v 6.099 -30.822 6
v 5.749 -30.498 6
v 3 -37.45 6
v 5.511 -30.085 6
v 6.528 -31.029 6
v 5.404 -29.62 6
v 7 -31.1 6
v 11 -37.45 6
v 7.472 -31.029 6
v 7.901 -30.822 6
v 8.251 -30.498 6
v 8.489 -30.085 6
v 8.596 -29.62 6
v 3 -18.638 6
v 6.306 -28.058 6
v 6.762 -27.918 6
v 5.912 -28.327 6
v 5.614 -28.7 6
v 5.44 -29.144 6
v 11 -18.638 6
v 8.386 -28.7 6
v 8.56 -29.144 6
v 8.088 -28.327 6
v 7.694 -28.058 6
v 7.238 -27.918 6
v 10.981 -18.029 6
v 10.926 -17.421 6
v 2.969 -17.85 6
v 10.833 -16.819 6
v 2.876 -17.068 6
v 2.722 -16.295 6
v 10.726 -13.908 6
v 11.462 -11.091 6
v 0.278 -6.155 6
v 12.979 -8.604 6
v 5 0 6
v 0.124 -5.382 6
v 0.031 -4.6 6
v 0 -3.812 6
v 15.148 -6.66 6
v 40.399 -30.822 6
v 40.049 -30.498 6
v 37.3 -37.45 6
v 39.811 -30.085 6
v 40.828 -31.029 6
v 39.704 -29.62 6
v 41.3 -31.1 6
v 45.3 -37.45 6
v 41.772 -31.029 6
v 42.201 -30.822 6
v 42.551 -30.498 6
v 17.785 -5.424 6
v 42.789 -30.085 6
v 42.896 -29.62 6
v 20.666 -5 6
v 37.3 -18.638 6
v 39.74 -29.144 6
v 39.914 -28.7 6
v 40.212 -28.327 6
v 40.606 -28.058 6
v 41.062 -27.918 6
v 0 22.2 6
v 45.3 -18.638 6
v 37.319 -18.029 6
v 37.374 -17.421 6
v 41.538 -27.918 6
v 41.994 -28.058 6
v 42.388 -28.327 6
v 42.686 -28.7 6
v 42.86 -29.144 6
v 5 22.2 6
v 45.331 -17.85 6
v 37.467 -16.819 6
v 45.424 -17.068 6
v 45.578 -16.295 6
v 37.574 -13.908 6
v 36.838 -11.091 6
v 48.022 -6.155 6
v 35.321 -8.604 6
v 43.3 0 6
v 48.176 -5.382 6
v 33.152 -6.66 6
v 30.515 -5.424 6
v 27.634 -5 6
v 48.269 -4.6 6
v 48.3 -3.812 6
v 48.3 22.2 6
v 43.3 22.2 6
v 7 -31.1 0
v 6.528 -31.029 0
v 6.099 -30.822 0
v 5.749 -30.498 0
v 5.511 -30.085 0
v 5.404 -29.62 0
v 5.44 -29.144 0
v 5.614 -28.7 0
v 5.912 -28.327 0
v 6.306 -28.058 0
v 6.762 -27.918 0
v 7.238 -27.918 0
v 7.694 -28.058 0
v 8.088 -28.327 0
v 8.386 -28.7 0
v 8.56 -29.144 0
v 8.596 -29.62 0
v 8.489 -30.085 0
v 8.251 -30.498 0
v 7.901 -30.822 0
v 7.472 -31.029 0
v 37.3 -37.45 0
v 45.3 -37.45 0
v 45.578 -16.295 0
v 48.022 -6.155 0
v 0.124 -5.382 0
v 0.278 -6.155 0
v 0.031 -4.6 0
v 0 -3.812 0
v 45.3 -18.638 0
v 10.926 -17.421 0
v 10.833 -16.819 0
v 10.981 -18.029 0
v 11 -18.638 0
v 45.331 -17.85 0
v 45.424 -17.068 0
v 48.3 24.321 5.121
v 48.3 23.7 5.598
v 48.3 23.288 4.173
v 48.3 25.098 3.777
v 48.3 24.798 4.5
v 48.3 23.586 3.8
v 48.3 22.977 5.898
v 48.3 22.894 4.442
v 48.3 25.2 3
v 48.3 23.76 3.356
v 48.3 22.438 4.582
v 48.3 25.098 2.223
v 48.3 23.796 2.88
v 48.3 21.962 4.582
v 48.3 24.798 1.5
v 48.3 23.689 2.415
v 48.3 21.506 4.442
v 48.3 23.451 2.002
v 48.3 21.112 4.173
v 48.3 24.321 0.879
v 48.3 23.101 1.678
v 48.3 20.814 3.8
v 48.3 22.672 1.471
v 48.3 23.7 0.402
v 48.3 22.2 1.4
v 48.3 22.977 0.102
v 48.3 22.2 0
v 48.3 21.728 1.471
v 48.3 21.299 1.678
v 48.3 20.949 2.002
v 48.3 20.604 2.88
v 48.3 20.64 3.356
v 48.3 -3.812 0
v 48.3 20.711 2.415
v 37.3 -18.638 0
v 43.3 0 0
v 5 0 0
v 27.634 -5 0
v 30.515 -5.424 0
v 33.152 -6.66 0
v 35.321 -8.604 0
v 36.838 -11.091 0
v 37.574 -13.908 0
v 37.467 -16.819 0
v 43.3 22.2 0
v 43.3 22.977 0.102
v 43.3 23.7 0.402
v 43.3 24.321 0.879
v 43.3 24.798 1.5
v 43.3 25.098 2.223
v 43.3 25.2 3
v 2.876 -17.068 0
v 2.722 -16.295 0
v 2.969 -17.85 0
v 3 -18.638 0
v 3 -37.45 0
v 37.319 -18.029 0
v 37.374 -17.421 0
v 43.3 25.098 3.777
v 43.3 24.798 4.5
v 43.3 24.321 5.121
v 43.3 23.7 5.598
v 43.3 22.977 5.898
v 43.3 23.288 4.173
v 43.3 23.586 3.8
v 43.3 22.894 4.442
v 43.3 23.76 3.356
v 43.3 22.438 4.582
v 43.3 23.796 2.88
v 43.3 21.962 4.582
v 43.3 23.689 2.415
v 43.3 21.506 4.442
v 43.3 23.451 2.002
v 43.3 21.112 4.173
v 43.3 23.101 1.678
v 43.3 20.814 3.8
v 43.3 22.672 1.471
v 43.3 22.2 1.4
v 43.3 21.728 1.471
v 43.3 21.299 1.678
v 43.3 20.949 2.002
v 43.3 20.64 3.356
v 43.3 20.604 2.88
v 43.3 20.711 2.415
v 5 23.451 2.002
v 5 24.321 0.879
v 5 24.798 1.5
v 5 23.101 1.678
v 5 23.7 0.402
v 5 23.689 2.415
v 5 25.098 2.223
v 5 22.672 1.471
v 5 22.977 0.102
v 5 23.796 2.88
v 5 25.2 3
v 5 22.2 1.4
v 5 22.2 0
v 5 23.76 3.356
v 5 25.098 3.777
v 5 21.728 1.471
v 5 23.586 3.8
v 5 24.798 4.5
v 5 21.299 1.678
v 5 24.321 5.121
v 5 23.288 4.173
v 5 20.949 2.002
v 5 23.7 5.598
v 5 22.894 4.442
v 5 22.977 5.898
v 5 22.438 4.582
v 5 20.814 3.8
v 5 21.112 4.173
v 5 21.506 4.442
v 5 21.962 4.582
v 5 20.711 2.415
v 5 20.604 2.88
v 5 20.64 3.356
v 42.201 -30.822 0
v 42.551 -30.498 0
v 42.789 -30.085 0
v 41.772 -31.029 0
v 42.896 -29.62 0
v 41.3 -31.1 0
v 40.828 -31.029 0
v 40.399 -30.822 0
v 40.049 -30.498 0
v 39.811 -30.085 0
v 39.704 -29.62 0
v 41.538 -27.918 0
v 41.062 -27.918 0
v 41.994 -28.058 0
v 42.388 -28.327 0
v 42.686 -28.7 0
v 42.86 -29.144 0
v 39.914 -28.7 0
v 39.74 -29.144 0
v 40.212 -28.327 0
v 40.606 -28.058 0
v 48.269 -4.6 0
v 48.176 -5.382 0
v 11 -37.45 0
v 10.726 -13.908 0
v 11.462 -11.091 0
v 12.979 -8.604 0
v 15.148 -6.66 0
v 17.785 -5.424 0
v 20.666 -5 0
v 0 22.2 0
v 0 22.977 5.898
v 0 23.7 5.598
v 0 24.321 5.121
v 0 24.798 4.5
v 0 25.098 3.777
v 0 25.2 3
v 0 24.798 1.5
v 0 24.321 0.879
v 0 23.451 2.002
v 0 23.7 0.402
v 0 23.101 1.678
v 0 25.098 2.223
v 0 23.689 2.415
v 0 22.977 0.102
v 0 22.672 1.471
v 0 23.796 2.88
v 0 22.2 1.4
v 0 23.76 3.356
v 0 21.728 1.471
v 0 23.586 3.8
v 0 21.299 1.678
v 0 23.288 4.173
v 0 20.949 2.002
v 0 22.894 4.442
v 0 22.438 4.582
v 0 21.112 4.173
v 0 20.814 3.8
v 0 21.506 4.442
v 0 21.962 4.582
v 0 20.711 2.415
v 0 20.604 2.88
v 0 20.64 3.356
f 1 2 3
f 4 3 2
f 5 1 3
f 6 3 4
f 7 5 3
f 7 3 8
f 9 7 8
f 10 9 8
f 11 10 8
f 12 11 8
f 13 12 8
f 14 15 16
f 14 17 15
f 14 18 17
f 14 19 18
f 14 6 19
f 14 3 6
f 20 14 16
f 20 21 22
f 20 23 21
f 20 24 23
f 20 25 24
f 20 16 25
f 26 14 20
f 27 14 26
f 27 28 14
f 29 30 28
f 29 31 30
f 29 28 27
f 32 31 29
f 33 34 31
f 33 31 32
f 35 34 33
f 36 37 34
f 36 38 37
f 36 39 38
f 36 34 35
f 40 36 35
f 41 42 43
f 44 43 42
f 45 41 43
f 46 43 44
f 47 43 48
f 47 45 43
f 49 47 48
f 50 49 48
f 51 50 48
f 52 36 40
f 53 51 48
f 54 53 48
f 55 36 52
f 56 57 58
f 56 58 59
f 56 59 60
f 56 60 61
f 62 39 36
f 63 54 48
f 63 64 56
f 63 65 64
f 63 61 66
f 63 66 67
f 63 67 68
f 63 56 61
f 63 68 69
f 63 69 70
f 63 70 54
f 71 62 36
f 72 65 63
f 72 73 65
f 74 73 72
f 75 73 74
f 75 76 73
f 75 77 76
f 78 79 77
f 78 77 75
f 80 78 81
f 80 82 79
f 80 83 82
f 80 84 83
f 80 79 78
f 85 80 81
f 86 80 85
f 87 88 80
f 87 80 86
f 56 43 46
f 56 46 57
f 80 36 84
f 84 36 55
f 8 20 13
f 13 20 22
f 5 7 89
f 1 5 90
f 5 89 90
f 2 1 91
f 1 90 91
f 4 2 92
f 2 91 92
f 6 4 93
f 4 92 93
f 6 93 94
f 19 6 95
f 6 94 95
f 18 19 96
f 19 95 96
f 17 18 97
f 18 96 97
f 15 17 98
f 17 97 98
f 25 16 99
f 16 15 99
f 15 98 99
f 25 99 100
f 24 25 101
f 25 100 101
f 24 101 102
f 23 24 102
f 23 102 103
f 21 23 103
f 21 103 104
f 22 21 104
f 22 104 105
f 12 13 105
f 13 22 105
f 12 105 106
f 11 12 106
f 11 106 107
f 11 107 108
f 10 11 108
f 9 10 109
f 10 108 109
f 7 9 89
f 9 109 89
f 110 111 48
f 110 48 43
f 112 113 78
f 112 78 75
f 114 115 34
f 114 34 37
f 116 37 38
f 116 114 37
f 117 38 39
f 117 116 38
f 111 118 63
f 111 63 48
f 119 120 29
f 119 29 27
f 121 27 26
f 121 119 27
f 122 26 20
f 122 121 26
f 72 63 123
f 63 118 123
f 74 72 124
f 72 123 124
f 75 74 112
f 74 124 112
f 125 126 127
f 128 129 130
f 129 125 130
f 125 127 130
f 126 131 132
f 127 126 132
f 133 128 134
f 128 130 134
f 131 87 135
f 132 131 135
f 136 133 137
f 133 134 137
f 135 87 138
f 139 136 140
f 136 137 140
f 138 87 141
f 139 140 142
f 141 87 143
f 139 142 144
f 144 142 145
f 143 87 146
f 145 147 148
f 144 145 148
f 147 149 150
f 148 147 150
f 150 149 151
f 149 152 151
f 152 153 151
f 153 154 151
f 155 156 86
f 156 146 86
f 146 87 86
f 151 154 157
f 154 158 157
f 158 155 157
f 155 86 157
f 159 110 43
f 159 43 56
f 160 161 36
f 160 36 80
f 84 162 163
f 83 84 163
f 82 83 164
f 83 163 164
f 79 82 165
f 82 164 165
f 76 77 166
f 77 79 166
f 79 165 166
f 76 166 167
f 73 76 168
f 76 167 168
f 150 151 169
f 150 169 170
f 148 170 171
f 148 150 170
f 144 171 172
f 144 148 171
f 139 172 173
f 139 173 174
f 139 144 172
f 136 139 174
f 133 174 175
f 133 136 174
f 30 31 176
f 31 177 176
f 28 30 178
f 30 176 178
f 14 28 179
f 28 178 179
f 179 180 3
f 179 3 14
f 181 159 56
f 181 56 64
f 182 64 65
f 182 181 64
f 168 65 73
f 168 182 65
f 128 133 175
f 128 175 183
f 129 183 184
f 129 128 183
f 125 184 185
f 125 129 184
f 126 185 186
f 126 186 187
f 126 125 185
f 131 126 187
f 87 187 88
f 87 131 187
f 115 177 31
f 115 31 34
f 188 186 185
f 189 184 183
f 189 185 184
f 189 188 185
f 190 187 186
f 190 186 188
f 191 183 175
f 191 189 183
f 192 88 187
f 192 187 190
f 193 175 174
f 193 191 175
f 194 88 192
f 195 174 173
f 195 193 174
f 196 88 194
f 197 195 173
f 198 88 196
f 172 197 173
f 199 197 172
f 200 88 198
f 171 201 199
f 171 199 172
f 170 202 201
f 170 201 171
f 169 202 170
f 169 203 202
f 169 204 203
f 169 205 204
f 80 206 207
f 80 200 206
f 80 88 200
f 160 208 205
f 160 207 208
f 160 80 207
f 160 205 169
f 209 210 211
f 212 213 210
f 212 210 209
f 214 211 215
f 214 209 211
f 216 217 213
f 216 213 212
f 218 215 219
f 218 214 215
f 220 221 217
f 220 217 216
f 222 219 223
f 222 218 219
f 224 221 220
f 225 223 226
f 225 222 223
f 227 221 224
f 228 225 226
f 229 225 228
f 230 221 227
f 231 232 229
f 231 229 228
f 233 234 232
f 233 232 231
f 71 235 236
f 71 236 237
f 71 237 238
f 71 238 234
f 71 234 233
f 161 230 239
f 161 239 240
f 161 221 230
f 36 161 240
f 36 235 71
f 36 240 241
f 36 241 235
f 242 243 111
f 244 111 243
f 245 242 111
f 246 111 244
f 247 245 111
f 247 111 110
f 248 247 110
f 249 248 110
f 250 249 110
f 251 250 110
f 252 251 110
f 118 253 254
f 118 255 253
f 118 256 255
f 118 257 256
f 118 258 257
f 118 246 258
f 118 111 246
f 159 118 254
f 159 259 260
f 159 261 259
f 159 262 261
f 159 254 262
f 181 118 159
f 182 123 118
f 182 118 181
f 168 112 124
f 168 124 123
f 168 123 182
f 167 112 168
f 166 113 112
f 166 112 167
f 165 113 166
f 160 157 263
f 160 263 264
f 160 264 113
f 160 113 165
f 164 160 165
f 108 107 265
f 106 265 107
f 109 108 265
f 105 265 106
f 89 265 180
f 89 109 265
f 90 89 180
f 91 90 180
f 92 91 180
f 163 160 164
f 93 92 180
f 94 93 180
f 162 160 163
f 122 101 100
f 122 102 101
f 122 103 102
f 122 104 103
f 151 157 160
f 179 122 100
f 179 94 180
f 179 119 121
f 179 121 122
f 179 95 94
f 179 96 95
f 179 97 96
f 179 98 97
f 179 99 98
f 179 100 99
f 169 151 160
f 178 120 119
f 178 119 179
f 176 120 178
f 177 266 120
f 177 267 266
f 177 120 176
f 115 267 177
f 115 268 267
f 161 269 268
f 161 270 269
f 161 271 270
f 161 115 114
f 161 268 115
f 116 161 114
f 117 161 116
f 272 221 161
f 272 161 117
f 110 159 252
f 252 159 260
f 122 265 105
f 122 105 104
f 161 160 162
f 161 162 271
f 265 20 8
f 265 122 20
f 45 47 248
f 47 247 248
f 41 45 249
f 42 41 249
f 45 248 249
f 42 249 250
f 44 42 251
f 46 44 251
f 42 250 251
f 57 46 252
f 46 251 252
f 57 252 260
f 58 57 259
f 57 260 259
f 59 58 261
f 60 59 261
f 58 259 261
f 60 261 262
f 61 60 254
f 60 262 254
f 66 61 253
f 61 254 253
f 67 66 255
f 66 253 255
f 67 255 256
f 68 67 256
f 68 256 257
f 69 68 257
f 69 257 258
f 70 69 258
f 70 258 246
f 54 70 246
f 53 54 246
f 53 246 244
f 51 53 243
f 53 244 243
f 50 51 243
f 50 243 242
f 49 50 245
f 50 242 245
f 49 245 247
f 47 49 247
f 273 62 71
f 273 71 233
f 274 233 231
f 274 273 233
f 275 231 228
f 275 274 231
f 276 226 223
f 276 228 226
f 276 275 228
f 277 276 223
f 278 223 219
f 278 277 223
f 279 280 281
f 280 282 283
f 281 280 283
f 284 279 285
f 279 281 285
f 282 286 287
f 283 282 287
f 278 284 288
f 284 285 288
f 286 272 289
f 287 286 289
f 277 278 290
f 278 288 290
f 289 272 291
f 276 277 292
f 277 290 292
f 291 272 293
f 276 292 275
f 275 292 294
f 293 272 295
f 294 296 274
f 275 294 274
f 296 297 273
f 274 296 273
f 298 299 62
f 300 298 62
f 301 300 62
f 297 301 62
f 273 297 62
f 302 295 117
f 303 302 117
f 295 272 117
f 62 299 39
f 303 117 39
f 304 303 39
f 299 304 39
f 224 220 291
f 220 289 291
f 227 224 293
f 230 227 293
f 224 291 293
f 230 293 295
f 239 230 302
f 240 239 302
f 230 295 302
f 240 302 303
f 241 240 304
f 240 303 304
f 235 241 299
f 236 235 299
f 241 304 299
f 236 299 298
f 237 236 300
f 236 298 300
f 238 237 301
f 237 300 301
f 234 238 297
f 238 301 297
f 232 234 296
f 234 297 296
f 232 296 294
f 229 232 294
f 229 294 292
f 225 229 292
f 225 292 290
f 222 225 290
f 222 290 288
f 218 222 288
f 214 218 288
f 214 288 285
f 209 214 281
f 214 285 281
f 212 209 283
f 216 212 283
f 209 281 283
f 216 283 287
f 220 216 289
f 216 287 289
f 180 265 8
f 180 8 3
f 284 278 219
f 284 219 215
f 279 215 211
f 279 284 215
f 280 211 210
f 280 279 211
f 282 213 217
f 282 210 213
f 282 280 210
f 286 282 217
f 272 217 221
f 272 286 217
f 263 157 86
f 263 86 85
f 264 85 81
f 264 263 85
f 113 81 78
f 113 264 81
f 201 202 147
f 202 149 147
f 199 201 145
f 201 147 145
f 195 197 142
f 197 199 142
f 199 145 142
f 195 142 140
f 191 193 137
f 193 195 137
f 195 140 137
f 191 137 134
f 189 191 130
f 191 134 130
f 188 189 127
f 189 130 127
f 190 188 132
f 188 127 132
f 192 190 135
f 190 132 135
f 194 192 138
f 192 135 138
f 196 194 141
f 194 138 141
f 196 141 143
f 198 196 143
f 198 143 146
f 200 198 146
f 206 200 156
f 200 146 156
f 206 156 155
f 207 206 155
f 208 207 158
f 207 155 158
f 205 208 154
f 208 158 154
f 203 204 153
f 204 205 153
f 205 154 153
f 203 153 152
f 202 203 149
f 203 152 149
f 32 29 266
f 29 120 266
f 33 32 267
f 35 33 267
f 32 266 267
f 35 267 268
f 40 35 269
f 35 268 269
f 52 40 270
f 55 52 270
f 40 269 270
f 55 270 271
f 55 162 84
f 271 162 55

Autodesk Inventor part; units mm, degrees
ref_plane "YZ Plane" through (0, 0, 0) normal (1, 0, 0) x (0, 1, 0)
ref_plane "XZ Plane" through (0, 0, 0) normal (0, 1, 0) x (-1, 0, 0)
sketch "Эскиз1" plane through (0, 0, 0) normal (0, 0, 1) x (1, 0, 0)
  line L0 (0, 0) -> (5, 0)
  line L1 (5, 0) -> (5, 18)
  line L2 (5, 18) -> (0, 18)
  line L3 (0, 18) -> (0, 0)
  line L4 (0, 0) -> (24.15, 0)
  line L5 (24.15, 0) -> (24.15, -5)
  line L6 (24.15, -5) -> (0, -5)
  line L7 (0, -5) -> (0, 0)
  dimension "d0" = 5
  dimension "d1" = 18
  dimension "d2" = 24.15
  dimension "d3" = 5
extrude "Выдавливание1" add sketch "Эскиз1" along normal blind 6
sketch "Эскиз4" plane through (0, 18, 0) normal (0, 1, 0) x (1, 0, 0)
  line L0 (0, 0) -> (0, -6) projected
  line L1 (0, 0) -> (0, -6) projected
  line L2 (5, 0) -> (0, 0) projected
  line L3 (0, 0) -> (0, -6) projected
  line L4 (5, -6) -> (0, -6) projected
  line L5 (5, 0) -> (5, -6) projected
extrude "Выдавливание2" add sketch "Эскиз4" along normal blind 7.2
fillet "Сопряжение1" radius 3 2 edges at (2.5, 25.2, 6) (2.5, 25.2, 0)
sketch "Эскиз5" plane through (5, 0, 6) normal (1, 0, 0) x (0, 0, -1)
  line L0 (0, -5) -> (0, -5) projected
  arc A0 (6, 22.2) -> (0, 22.2) centre (3, 22.2) ccw projected
  point P0 (6, 0)
  point P1 (6, -5)
  point P2 (2.5, 25.2)
hole "Отверстие2" at (5, 22.2, 3) direction (-1, 0, 0) diameter 3.2 depth 5
mirror "Зеркальное отражение1" about plane through (24.15, -5, 0) normal (1, 0, 0)
sketch "Эскиз9" plane through (0, 0, 0) normal (0, 0, -1) x (-1, 0, 0)
  line L0 (0, -5) -> (-48.3, -5) projected
  line L1 (-48.3, 22.2) -> (-48.3, -5) projected
  line L2 (-48.3, -5) -> (-45.3, -17.45)
  line L3 (-45.3, -17.45) -> (-45.3, -37.45)
  line L4 (-45.3, -37.45) -> (-37.3, -37.45)
  line L5 (-37.3, -37.45) -> (-37.3, -17.45)
  line L6 (-37.3, -17.45) -> (-40.3, -5)
  point P0 (0, 0)
  point P1 (-40.3, -5)
  dimension "d82" = 32.45
  dimension "d83" = 8
  dimension "d86" = 20
  dimension "d93" = 3
extrude "Выдавливание4" add sketch "Эскиз9" against normal blind 6
sketch "Эскиз11" plane through (0, 0, 6) normal (0, 0, 1) x (1, 0, 0)
  line L0 (41.3, -37.45) -> (41.3, -29.5)
  line L1 (37.3, -37.45) -> (45.3, -37.45) projected
  point P0 (0, 0)
  dimension "d91" = 7.95
hole "Отверстие6" at (41.3, -29.5, 6) direction (0, 0, -1) diameter 3.2 end through all
ref_plane "РабПлоскость1" through (24.15, 22.2, 3) normal (1, 0, 0) x (0, 0, -1)
mirror "Зеркальное отражение2" about plane through (24.15, 22.2, 3) normal (1, 0, 0) of "Выдавливание4", "Отверстие6"
fillet "Сопряжение3" radius 10 8 edges at (45.3, -17.45, 3) (37.3, -17.45, 3) (11, -17.45, 3) (3, -17.45, 3) (0, -5, 3) (8, -5, 3) (40.3, -5, 3) (48.3, -5, 3)
equation "\"Радиус_гибки\" = Толщина"
equation "\"Ширина_просечки\" = Толщина"
equation "\"Глубина_просечки\" = 0.5 * Толщина"
equation "\"Размер_просечки\" = 4 * Толщина"
equation "\"Мин_остаток\" = 2 * Толщина"
equation "\"Радиус_перехода\" = Радиус_гибки"
equation "\"Радиус_Якоби\" = Толщина"
equation "\"Размер_зазора\" = Толщина"
equation "\"Толщина\" = 0.5"
properties part number "Стойка для камеры"
